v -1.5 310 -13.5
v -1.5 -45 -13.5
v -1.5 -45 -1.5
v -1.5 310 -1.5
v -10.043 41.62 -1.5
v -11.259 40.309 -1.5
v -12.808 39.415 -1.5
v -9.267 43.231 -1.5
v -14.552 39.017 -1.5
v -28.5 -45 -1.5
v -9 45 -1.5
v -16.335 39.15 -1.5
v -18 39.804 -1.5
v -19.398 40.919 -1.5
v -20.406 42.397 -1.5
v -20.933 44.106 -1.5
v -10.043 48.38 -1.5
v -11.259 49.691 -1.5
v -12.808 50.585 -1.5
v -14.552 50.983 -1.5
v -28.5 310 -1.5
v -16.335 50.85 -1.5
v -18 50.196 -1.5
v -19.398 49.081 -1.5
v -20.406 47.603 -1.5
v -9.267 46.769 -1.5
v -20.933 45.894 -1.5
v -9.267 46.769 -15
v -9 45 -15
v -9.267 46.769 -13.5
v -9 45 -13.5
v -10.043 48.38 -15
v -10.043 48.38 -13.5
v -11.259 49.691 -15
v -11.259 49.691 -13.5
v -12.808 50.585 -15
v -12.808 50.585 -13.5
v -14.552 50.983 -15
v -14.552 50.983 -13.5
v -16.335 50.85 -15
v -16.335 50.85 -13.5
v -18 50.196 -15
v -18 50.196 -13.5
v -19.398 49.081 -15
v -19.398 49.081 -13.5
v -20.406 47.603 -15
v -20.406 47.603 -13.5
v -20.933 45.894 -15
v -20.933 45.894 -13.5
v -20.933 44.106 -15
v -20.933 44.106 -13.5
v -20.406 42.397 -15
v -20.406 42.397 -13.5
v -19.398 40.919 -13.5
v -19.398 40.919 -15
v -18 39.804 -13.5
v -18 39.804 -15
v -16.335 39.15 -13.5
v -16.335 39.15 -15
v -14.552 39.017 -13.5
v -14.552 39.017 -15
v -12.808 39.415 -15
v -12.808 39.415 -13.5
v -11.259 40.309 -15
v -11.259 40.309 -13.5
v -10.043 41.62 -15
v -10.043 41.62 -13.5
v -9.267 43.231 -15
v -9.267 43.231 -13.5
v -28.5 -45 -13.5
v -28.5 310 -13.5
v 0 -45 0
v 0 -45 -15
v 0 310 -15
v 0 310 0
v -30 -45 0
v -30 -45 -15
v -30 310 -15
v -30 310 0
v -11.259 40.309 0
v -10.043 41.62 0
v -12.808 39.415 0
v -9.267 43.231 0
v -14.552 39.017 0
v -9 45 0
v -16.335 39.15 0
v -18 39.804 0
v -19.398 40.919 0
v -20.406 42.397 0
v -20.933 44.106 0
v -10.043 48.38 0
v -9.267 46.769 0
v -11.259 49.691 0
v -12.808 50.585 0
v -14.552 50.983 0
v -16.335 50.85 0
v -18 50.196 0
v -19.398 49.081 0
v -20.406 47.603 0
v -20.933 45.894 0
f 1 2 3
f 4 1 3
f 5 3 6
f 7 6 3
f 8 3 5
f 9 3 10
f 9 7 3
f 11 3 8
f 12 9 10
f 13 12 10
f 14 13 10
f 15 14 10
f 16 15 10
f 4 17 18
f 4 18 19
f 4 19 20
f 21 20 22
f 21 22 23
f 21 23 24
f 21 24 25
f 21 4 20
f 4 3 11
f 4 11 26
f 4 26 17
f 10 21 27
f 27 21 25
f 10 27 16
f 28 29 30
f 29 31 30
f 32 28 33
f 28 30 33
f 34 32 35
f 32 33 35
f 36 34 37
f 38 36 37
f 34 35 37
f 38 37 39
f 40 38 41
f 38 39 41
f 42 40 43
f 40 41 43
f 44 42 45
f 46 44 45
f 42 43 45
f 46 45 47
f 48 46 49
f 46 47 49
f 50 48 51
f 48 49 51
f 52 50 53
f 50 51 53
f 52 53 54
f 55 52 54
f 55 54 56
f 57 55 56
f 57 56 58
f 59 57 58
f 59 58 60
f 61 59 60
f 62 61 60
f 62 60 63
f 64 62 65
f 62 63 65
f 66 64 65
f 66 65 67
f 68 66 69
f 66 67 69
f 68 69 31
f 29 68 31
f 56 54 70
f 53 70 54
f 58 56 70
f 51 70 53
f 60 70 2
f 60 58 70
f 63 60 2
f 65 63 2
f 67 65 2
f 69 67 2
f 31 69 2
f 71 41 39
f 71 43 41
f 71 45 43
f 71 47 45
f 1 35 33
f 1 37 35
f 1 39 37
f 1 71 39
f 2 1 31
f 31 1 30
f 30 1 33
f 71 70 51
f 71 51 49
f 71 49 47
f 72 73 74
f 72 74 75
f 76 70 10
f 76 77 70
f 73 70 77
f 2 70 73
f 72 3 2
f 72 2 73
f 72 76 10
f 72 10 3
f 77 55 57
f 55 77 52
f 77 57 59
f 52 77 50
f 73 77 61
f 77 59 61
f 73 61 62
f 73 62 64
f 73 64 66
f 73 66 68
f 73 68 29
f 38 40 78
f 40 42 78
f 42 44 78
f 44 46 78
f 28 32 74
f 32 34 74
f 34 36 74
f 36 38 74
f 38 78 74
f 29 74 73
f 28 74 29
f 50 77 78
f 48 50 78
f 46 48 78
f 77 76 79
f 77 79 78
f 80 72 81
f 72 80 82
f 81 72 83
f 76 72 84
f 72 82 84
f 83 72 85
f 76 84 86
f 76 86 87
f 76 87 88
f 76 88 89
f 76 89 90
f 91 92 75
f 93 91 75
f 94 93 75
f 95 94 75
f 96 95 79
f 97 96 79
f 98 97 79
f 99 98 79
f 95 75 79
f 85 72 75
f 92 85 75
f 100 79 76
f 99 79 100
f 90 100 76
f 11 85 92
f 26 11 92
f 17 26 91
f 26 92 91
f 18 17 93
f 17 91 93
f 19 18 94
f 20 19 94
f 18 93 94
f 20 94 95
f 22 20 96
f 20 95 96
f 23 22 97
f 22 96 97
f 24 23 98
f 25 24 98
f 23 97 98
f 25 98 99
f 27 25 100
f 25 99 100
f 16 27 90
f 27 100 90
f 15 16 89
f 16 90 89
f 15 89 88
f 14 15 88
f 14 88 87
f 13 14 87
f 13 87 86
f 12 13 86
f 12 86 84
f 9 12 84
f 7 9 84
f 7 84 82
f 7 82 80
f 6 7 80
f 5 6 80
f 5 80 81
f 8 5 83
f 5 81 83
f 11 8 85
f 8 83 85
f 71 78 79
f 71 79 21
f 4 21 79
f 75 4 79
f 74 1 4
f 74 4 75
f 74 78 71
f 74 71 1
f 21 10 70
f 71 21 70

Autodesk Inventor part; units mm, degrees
ref_plane "YZ Plane" through (0, 0, 0) normal (1, 0, 0) x (0, 1, 0)
ref_plane "XZ Plane" through (0, 0, 0) normal (0, 1, 0) x (-1, 0, 0)
ref_plane "XY Plane" through (0, 0, 0) normal (0, 0, 1) x (1, 0, 0)
sketch "スケッチ1" plane through (0, 0, 0) normal (0, 1, 0) x (-1, 0, 0)
  line L0 (0, 0) -> (30, 0)
  line L1 (30, 0) -> (30, -15)
  line L2 (30, -15) -> (0, -15)
  line L3 (0, -15) -> (0, 0)
  dimension "d0" = 30
  dimension "d1" = 15
extrude "押し出し1" add sketch "スケッチ1" along normal blind 300
sketch "スケッチ2" plane through (-30, 0, 0) normal (0, 0, 1) x (1, 0, 0)
  circle A0 centre (15, 45) radius 5
  line L0 (0, 0) -> (30, 0) projected
  line L1 (30, 0) -> (30, 300) projected
  dimension "d4" = 10
  dimension "d5" = 45
  dimension "d6" = 15
extrude "押し出し2" cut sketch "スケッチ2" against normal blind 300
sketch "スケッチ3" plane through (0, 0, 0) normal (0, -1, 0) x (1, 0, 0)
  line L0 (-30, 0) -> (0, 0) projected
  line L1 (0, 0) -> (-30, 0)
  line L2 (-30, 0) -> (-30, -15)
  line L3 (-30, -15) -> (0, -15)
  line L4 (0, -15) -> (0, 0)
  dimension "d9" = 30
  dimension "d10" = 15
extrude "押し出し3" cut sketch "スケッチ3" against normal blind 10
sketch "スケッチ5" plane through (0, 300, 0) normal (0, 1, 0) x (1, 0, 0)
  line L0 (0, 0) -> (0, 15) projected
  line L1 (0, 15) -> (-30, 15) projected
  line L2 (0, 0) -> (-30, 0)
  line L3 (-30, 0) -> (-30, 15)
  line L4 (-30, 15) -> (0, 15)
  line L5 (0, 15) -> (0, 0)
extrude "押し出し4" add sketch "スケッチ5" along normal blind 10
sketch "スケッチ6" plane through (0, 10, 0) normal (0, -1, 0) x (1, 0, 0)
  line L0 (0, 0) -> (-30, 0)
  line L1 (-30, 0) -> (-30, -15)
  line L2 (-30, -15) -> (0, -15)
  line L3 (0, -15) -> (0, 0)
extrude "押し出し5" add sketch "スケッチ6" along normal blind 60
sketch "スケッチ7" plane through (0, -50, 0) normal (0, -1, 0) x (1, 0, 0)
  line L0 (0, 0) -> (0, -15) projected
  line L1 (0, -15) -> (-30, -15) projected
  line L2 (0, 0) -> (-30, 0)
  line L3 (-30, 0) -> (-30, -15)
  line L4 (-30, -15) -> (0, -15)
  line L5 (0, -15) -> (0, 0)
extrude "押し出し6" cut sketch "スケッチ7" against normal blind 5
sketch "スケッチ8" plane through (-30, 310, 0) normal (0, 0, 1) x (1, 0, 0)
  circle A0 centre (15, -265) radius 6
  line L0 (0, -355) -> (30, -355) projected
  line L1 (0, -355) -> (0, 0) projected
  circle A1 centre (15, -265) radius 5
  point P0 (30, -310)
  dimension "d19" = 12
  dimension "d20" = 90
  dimension "d21" = 15
  dimension "d22" = 10
extrude "押し出し7" cut sketch "スケッチ8" against normal blind 15
sketch "スケッチ9" plane through (0, 310, 0) normal (0, 1, 0) x (1, 0, 0)
  line L0 (-28.5, 13.5) -> (-1.5, 13.5)
  line L1 (-1.5, 13.5) -> (-1.5, 1.5)
  line L2 (-1.5, 1.5) -> (-28.5, 1.5)
  line L3 (-28.5, 1.5) -> (-28.5, 13.5)
  line L4 (0, 15) -> (-30, 15) projected
  line L5 (-30, 15) -> (-30, 0) projected
  point P0 (0, 0)
  dimension "d25" = 27
  dimension "d26" = 12
  dimension "d27" = 1.5
  dimension "d28" = 1.5
extrude "押し出し8" cut sketch "スケッチ9" against normal blind 500
properties part number "射出_腕" material "アルミニウム 6061"
